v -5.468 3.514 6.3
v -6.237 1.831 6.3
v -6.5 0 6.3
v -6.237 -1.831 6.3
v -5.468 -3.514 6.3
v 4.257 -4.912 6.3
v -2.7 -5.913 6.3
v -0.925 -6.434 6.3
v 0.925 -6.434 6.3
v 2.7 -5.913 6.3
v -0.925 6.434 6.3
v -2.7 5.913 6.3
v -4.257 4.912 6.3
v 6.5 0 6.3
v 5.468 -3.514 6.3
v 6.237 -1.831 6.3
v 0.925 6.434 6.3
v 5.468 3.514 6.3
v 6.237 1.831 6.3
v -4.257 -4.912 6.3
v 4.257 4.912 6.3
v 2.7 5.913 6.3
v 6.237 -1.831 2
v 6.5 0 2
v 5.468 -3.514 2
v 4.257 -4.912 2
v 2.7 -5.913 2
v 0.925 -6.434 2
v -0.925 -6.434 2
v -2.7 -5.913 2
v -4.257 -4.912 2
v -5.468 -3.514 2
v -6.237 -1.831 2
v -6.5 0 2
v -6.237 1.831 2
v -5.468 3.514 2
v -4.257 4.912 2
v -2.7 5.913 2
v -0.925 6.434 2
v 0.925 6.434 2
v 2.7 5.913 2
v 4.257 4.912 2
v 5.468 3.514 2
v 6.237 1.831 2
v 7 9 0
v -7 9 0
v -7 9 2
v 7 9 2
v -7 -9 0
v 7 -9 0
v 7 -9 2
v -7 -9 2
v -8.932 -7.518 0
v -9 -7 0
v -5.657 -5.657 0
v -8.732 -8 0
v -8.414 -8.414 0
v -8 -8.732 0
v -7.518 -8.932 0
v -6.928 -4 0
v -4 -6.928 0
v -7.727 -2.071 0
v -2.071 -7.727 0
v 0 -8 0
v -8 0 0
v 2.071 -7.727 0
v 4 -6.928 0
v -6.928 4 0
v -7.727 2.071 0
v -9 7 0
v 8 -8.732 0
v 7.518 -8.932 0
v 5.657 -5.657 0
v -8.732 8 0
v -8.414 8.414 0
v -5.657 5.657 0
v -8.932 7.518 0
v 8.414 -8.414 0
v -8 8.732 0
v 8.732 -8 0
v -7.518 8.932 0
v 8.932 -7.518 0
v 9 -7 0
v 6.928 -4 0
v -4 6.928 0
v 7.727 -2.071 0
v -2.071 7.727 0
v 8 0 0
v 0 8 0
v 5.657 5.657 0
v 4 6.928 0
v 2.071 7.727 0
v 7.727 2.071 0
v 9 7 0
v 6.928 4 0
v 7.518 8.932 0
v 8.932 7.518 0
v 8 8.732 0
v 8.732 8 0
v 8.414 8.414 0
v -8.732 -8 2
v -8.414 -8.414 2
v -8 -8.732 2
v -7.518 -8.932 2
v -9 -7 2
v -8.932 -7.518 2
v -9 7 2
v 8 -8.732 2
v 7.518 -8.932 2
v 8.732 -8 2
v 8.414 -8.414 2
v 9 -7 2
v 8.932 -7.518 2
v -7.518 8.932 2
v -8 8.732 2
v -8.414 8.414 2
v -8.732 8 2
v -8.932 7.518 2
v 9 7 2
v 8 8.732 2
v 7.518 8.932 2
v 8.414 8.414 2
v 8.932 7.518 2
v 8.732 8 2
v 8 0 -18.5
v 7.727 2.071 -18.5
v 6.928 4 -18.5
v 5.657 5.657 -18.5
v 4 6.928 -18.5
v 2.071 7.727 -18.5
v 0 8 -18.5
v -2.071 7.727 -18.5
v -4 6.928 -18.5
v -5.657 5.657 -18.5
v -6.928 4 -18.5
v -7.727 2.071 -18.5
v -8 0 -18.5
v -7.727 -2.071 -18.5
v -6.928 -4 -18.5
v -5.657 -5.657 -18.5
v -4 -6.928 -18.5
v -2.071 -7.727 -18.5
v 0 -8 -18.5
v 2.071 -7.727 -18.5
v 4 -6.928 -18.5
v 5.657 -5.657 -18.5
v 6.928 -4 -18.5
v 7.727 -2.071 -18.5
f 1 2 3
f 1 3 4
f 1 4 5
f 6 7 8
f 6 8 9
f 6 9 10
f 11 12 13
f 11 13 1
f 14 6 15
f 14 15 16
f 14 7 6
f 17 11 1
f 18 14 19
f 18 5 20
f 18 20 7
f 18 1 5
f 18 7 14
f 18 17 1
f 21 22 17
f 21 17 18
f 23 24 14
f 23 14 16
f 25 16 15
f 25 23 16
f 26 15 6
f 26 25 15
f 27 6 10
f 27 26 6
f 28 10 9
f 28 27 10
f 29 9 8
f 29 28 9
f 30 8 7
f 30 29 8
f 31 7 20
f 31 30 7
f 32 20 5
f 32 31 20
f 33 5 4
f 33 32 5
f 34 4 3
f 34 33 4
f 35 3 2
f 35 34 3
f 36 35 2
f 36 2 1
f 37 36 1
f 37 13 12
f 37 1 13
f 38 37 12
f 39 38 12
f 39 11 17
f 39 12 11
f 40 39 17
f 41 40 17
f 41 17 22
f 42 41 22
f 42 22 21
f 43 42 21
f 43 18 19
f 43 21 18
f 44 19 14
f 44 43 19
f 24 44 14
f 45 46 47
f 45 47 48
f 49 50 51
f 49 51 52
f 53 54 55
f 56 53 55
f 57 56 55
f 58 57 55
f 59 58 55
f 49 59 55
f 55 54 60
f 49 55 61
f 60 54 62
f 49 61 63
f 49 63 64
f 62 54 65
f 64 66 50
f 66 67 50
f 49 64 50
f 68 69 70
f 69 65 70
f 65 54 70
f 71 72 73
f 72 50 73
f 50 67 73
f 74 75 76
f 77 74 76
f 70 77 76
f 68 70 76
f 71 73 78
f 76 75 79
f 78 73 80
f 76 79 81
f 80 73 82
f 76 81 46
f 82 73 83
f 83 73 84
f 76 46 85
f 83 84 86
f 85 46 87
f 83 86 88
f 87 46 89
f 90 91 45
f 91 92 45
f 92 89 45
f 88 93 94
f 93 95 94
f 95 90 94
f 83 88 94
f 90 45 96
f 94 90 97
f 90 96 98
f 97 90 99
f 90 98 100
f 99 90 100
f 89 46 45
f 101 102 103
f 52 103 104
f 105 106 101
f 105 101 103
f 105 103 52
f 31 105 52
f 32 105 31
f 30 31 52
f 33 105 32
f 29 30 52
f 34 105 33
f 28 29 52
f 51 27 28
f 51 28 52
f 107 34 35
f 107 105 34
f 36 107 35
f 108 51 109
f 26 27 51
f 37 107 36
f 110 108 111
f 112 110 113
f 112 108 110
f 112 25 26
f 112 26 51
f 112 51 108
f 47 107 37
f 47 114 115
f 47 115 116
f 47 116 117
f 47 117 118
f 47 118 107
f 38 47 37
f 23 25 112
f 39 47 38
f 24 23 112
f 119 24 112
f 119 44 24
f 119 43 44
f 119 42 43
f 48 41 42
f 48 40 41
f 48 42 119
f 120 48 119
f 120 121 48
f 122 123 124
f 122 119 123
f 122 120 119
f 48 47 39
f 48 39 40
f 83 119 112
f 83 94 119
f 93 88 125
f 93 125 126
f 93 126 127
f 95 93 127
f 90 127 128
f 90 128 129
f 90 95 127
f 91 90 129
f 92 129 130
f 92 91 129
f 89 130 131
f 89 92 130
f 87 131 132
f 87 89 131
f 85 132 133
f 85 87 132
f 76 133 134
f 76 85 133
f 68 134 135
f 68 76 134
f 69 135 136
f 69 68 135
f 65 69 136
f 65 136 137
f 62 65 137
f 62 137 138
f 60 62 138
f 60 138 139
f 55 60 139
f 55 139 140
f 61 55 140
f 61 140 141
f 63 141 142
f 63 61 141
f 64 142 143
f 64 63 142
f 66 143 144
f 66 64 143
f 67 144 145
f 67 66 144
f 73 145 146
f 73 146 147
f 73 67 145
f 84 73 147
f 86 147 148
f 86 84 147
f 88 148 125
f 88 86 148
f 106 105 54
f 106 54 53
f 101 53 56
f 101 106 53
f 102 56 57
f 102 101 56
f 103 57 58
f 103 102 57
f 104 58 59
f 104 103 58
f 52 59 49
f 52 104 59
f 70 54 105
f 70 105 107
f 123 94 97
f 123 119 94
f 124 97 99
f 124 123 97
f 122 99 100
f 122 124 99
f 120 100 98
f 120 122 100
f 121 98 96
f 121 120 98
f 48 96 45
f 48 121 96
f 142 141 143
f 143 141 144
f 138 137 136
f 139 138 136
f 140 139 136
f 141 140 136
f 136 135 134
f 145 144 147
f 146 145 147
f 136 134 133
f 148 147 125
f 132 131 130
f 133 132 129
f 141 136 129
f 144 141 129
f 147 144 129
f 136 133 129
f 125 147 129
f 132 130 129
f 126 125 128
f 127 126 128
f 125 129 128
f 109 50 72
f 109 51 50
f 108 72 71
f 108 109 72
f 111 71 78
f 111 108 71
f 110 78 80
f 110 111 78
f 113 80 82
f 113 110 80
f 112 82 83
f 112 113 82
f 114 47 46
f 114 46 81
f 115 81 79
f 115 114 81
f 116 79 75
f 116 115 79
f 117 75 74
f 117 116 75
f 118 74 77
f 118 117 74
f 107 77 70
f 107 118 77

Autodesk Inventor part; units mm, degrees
ref_plane "YZ Plane" through (0, 0, 0) normal (1, 0, 0) x (0, 1, 0)
ref_plane "XZ Plane" through (0, 0, 0) normal (0, 1, 0) x (-1, 0, 0)
ref_plane "XY Plane" through (0, 0, 0) normal (0, 0, 1) x (1, 0, 0)
sketch "Sketch1" plane through (0, 0, 0) normal (0, 0, 1) x (1, 0, 0)
  circle A0 centre (0, 0) radius 8
  dimension "d0" = 16
extrude "Extrusion1" add sketch "Sketch1" against normal blind 18.5
sketch "Sketch2" plane through (0, 0, 0) normal (0, 0, 1) x (1, 0, 0)
  line L0 (-9, 9) -> (9, 9)
  line L1 (9, 9) -> (9, -9)
  line L2 (9, -9) -> (-9, -9)
  line L3 (-9, -9) -> (-9, 9)
  point P0 (0, 0)
  dimension "d3" = 18
  dimension "d4" = 18
  dimension "d5" = 9
  dimension "d6" = 9
extrude "Extrusion2" add sketch "Sketch2" along normal blind 2
sketch "Sketch3" plane through (0, 0, 2) normal (0, 0, 1) x (1, 0, 0)
  circle A0 centre (0, 0) radius 6.5
  dimension "d9" = 13
extrude "Extrusion3" add sketch "Sketch3" along normal blind 4.3
fillet "Fillet1" radius 2 4 edges at (9, 9, 1) (-9, 9, 1) (9, -9, 1) (-9, -9, 1)
properties part number "Button"
